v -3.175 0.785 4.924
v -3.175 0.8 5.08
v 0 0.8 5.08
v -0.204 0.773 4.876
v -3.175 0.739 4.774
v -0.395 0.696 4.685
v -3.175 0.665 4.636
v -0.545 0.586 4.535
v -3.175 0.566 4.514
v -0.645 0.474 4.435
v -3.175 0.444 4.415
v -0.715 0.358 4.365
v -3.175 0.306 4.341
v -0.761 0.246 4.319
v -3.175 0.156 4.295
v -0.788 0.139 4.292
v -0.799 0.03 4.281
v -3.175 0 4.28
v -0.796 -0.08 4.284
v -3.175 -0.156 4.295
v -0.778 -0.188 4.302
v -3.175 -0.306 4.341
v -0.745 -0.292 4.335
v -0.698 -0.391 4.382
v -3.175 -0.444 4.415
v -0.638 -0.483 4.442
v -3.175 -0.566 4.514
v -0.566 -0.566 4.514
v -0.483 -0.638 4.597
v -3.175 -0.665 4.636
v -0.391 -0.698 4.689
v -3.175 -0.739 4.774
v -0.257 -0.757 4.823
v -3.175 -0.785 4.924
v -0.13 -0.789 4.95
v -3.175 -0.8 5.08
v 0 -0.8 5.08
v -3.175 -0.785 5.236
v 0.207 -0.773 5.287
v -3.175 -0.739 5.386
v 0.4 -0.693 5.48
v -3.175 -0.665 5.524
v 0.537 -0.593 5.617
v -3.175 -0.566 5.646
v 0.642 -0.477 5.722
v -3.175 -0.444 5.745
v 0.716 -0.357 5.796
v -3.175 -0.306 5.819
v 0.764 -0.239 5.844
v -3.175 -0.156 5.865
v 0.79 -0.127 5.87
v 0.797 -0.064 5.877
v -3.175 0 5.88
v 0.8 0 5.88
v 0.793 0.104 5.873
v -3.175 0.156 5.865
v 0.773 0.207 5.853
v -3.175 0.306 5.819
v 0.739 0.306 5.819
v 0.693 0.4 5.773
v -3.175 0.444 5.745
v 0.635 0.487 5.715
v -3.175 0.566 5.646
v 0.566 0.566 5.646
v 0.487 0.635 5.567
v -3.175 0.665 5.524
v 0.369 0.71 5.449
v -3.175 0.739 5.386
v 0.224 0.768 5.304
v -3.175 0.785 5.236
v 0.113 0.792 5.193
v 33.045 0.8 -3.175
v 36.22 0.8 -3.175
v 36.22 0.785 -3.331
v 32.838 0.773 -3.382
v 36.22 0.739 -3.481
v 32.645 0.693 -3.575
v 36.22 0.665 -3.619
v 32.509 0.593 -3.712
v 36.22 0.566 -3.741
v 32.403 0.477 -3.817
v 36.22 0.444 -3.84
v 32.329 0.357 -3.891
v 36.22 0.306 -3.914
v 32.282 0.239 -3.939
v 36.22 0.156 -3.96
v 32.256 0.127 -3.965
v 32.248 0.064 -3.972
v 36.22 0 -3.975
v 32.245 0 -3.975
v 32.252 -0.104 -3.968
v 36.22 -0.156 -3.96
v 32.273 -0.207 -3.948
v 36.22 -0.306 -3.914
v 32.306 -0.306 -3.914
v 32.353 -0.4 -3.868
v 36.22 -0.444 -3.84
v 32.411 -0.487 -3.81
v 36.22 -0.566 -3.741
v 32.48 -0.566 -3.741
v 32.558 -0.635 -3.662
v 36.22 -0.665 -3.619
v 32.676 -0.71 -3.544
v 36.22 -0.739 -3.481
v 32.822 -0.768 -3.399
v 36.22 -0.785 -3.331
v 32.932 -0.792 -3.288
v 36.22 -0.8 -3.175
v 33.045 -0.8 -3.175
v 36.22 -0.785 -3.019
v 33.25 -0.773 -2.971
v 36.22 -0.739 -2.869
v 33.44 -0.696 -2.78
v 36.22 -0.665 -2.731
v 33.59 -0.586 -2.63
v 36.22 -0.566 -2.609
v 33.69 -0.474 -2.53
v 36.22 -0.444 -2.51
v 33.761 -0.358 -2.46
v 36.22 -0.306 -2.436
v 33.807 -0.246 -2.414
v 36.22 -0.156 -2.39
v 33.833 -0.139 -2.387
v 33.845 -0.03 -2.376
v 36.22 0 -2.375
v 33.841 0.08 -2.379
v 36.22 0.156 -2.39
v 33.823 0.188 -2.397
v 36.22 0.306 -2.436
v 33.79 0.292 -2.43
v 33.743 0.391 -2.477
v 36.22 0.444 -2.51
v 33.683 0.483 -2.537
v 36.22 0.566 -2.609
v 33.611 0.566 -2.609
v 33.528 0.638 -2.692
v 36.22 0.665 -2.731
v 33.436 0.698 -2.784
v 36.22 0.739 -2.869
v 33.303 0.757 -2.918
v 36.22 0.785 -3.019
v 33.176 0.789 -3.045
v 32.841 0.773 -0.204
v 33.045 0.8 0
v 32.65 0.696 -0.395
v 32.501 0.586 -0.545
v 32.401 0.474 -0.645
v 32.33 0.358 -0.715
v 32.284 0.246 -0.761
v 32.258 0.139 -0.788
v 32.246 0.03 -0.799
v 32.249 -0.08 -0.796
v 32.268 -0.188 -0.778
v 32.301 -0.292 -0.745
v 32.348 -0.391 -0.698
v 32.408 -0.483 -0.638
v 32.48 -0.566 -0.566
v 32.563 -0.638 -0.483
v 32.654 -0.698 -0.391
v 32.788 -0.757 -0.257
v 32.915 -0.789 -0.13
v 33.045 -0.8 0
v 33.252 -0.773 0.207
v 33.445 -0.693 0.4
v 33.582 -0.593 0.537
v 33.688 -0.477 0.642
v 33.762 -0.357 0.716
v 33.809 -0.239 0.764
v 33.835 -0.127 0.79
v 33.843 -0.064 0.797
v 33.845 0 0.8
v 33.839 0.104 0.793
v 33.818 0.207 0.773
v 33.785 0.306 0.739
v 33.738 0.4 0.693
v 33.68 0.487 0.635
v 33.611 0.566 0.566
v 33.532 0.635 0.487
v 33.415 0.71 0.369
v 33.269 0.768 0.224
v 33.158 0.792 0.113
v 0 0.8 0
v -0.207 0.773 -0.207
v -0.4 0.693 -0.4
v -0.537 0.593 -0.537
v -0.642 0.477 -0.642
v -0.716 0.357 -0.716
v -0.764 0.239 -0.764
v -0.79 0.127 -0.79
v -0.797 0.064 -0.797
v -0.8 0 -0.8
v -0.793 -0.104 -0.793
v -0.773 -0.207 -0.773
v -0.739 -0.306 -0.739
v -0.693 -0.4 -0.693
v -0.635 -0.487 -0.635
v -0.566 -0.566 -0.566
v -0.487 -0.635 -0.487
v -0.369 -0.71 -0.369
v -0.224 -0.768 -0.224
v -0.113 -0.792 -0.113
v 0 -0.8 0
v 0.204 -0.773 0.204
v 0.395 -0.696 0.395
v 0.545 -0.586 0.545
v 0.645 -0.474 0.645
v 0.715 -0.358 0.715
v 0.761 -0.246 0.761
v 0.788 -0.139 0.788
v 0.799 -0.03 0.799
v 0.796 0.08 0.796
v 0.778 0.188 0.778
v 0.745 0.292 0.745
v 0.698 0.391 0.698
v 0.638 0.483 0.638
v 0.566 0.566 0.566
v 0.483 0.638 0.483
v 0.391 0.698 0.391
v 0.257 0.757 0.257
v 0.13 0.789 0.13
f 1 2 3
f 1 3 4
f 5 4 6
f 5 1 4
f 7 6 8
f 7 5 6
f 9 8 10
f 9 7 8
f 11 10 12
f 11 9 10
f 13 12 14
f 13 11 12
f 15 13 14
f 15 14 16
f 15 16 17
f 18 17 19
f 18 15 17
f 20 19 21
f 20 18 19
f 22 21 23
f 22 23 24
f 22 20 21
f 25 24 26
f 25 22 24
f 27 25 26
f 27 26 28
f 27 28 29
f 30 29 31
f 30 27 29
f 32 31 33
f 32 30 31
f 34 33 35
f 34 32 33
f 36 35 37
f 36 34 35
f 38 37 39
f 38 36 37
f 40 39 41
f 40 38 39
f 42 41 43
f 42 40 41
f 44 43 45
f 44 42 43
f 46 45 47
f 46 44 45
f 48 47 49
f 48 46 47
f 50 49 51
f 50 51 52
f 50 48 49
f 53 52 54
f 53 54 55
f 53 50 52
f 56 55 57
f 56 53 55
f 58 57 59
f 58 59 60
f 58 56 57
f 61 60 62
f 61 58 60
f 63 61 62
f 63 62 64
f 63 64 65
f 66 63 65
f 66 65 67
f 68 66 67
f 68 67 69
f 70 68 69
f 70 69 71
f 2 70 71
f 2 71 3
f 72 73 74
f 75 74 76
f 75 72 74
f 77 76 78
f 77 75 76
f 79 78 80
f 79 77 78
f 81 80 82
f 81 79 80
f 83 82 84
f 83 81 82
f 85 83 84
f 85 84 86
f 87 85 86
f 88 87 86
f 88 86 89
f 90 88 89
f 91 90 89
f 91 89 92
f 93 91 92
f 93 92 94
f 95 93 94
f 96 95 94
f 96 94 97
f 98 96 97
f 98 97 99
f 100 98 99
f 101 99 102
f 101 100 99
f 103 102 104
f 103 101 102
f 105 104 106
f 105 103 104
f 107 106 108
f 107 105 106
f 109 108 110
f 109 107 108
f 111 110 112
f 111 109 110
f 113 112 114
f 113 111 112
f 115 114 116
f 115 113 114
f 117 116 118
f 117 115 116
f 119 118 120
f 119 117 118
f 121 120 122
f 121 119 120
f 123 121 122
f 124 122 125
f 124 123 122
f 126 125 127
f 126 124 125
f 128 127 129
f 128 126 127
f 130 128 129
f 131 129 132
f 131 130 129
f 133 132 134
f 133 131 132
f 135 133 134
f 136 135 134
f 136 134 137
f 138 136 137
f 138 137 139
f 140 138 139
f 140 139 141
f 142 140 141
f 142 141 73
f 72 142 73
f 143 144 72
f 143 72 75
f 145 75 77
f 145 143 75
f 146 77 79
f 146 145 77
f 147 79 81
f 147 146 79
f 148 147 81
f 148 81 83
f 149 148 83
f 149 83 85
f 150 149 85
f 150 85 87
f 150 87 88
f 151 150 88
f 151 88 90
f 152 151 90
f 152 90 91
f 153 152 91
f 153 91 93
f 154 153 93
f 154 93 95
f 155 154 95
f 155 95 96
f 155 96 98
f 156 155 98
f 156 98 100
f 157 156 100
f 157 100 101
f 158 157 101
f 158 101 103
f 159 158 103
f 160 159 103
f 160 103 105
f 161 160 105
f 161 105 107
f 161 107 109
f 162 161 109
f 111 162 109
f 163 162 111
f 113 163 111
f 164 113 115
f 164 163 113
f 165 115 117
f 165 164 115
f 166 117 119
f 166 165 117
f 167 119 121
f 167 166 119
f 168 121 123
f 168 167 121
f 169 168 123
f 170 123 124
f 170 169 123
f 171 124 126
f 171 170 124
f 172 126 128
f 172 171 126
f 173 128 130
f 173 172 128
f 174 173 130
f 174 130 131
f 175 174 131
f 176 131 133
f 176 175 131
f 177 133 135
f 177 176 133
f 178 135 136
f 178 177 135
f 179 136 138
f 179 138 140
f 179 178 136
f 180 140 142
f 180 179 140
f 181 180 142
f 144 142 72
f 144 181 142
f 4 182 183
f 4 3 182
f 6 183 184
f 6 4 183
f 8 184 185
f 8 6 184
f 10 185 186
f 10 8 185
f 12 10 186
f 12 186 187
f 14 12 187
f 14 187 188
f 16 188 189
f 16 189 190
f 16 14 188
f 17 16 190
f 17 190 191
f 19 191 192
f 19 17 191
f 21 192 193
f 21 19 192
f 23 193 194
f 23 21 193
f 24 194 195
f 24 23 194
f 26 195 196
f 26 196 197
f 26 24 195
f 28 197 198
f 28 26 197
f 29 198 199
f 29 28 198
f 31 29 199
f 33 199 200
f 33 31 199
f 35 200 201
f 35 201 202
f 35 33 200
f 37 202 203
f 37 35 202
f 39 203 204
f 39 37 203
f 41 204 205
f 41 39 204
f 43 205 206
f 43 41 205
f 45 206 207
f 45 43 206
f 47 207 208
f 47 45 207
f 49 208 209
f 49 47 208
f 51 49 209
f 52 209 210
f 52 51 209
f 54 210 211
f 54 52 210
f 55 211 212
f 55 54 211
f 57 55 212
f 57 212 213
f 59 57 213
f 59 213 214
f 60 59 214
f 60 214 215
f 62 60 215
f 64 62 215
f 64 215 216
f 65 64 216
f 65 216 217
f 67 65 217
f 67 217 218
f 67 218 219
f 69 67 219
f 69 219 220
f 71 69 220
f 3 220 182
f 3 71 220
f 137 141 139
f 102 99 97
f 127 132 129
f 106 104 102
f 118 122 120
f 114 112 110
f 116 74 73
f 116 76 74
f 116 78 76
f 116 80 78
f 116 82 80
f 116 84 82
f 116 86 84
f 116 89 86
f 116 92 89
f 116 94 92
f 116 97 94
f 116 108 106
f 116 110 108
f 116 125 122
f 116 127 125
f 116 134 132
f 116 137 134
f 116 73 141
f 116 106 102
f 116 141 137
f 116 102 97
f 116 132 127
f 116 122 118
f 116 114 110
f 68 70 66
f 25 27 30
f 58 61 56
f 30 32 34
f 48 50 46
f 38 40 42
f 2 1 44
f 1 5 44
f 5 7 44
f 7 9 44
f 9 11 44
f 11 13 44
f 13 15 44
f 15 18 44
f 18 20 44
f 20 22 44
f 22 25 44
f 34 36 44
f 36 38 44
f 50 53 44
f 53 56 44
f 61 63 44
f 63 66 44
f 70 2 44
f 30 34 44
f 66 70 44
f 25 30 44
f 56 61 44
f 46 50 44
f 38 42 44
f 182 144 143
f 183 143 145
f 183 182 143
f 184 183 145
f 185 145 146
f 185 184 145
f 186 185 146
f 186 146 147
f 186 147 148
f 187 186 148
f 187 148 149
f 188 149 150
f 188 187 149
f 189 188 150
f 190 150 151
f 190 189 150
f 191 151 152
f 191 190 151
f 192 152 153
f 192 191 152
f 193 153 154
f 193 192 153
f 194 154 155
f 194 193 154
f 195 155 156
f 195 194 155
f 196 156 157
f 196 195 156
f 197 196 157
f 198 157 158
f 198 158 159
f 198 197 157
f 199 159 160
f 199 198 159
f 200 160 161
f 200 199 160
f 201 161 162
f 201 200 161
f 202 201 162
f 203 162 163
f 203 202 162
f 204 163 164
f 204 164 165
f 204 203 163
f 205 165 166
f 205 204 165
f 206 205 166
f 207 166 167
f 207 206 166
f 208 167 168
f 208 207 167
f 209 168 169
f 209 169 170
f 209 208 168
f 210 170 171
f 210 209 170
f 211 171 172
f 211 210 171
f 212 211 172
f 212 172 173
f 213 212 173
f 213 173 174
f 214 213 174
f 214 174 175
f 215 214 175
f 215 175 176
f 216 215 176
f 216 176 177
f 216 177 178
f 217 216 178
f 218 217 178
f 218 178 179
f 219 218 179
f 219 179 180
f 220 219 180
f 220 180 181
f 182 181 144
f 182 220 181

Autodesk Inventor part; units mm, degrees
ref_plane "XZ Plane" through (0, 0, 0) normal (0, 1, 0) x (-1, 0, 0)
ref_plane "XY Plane" through (0, 0, 0) normal (0, 0, 1) x (1, 0, 0)
sketch "Sketch1" plane through (0, 0, 0) normal (0, 1, 0) x (-1, 0, 0)
  line L0 (-33.0454, 0) -> (0, 0)
  line L1 (0, 0) -> (0, 5.08)
  line L2 (0, 5.08) -> (3.175, 5.08)
  line L3 (-33.0454, 0) -> (-33.0454, -3.175)
  line L4 (-33.0454, -3.175) -> (-36.2204, -3.175)
  dimension "d1" = 33.0454
  dimension "d6" = 5.08
  dimension "d7" = 3.175
  dimension "d8" = 3.175
  dimension "d9" = 3.175
ref_plane "Work Plane1" through (36.2204, 0, -3.175) normal (1, 0, 0) x (0, 1, 0)
sketch "Sketch2" plane through (36.2204, 0, -3.175) normal (1, 0, 0) x (0, 1, 0)
  circle A0 centre (0, 0) radius 0.8
  point P0 (0, 3.175)
  dimension "d10" = 1.6
sweep "Sweep1" add profiles "Sketch2" path "Sketch1"
properties part number "foreDivePlanesLinkage" material "Stainless Steel"
